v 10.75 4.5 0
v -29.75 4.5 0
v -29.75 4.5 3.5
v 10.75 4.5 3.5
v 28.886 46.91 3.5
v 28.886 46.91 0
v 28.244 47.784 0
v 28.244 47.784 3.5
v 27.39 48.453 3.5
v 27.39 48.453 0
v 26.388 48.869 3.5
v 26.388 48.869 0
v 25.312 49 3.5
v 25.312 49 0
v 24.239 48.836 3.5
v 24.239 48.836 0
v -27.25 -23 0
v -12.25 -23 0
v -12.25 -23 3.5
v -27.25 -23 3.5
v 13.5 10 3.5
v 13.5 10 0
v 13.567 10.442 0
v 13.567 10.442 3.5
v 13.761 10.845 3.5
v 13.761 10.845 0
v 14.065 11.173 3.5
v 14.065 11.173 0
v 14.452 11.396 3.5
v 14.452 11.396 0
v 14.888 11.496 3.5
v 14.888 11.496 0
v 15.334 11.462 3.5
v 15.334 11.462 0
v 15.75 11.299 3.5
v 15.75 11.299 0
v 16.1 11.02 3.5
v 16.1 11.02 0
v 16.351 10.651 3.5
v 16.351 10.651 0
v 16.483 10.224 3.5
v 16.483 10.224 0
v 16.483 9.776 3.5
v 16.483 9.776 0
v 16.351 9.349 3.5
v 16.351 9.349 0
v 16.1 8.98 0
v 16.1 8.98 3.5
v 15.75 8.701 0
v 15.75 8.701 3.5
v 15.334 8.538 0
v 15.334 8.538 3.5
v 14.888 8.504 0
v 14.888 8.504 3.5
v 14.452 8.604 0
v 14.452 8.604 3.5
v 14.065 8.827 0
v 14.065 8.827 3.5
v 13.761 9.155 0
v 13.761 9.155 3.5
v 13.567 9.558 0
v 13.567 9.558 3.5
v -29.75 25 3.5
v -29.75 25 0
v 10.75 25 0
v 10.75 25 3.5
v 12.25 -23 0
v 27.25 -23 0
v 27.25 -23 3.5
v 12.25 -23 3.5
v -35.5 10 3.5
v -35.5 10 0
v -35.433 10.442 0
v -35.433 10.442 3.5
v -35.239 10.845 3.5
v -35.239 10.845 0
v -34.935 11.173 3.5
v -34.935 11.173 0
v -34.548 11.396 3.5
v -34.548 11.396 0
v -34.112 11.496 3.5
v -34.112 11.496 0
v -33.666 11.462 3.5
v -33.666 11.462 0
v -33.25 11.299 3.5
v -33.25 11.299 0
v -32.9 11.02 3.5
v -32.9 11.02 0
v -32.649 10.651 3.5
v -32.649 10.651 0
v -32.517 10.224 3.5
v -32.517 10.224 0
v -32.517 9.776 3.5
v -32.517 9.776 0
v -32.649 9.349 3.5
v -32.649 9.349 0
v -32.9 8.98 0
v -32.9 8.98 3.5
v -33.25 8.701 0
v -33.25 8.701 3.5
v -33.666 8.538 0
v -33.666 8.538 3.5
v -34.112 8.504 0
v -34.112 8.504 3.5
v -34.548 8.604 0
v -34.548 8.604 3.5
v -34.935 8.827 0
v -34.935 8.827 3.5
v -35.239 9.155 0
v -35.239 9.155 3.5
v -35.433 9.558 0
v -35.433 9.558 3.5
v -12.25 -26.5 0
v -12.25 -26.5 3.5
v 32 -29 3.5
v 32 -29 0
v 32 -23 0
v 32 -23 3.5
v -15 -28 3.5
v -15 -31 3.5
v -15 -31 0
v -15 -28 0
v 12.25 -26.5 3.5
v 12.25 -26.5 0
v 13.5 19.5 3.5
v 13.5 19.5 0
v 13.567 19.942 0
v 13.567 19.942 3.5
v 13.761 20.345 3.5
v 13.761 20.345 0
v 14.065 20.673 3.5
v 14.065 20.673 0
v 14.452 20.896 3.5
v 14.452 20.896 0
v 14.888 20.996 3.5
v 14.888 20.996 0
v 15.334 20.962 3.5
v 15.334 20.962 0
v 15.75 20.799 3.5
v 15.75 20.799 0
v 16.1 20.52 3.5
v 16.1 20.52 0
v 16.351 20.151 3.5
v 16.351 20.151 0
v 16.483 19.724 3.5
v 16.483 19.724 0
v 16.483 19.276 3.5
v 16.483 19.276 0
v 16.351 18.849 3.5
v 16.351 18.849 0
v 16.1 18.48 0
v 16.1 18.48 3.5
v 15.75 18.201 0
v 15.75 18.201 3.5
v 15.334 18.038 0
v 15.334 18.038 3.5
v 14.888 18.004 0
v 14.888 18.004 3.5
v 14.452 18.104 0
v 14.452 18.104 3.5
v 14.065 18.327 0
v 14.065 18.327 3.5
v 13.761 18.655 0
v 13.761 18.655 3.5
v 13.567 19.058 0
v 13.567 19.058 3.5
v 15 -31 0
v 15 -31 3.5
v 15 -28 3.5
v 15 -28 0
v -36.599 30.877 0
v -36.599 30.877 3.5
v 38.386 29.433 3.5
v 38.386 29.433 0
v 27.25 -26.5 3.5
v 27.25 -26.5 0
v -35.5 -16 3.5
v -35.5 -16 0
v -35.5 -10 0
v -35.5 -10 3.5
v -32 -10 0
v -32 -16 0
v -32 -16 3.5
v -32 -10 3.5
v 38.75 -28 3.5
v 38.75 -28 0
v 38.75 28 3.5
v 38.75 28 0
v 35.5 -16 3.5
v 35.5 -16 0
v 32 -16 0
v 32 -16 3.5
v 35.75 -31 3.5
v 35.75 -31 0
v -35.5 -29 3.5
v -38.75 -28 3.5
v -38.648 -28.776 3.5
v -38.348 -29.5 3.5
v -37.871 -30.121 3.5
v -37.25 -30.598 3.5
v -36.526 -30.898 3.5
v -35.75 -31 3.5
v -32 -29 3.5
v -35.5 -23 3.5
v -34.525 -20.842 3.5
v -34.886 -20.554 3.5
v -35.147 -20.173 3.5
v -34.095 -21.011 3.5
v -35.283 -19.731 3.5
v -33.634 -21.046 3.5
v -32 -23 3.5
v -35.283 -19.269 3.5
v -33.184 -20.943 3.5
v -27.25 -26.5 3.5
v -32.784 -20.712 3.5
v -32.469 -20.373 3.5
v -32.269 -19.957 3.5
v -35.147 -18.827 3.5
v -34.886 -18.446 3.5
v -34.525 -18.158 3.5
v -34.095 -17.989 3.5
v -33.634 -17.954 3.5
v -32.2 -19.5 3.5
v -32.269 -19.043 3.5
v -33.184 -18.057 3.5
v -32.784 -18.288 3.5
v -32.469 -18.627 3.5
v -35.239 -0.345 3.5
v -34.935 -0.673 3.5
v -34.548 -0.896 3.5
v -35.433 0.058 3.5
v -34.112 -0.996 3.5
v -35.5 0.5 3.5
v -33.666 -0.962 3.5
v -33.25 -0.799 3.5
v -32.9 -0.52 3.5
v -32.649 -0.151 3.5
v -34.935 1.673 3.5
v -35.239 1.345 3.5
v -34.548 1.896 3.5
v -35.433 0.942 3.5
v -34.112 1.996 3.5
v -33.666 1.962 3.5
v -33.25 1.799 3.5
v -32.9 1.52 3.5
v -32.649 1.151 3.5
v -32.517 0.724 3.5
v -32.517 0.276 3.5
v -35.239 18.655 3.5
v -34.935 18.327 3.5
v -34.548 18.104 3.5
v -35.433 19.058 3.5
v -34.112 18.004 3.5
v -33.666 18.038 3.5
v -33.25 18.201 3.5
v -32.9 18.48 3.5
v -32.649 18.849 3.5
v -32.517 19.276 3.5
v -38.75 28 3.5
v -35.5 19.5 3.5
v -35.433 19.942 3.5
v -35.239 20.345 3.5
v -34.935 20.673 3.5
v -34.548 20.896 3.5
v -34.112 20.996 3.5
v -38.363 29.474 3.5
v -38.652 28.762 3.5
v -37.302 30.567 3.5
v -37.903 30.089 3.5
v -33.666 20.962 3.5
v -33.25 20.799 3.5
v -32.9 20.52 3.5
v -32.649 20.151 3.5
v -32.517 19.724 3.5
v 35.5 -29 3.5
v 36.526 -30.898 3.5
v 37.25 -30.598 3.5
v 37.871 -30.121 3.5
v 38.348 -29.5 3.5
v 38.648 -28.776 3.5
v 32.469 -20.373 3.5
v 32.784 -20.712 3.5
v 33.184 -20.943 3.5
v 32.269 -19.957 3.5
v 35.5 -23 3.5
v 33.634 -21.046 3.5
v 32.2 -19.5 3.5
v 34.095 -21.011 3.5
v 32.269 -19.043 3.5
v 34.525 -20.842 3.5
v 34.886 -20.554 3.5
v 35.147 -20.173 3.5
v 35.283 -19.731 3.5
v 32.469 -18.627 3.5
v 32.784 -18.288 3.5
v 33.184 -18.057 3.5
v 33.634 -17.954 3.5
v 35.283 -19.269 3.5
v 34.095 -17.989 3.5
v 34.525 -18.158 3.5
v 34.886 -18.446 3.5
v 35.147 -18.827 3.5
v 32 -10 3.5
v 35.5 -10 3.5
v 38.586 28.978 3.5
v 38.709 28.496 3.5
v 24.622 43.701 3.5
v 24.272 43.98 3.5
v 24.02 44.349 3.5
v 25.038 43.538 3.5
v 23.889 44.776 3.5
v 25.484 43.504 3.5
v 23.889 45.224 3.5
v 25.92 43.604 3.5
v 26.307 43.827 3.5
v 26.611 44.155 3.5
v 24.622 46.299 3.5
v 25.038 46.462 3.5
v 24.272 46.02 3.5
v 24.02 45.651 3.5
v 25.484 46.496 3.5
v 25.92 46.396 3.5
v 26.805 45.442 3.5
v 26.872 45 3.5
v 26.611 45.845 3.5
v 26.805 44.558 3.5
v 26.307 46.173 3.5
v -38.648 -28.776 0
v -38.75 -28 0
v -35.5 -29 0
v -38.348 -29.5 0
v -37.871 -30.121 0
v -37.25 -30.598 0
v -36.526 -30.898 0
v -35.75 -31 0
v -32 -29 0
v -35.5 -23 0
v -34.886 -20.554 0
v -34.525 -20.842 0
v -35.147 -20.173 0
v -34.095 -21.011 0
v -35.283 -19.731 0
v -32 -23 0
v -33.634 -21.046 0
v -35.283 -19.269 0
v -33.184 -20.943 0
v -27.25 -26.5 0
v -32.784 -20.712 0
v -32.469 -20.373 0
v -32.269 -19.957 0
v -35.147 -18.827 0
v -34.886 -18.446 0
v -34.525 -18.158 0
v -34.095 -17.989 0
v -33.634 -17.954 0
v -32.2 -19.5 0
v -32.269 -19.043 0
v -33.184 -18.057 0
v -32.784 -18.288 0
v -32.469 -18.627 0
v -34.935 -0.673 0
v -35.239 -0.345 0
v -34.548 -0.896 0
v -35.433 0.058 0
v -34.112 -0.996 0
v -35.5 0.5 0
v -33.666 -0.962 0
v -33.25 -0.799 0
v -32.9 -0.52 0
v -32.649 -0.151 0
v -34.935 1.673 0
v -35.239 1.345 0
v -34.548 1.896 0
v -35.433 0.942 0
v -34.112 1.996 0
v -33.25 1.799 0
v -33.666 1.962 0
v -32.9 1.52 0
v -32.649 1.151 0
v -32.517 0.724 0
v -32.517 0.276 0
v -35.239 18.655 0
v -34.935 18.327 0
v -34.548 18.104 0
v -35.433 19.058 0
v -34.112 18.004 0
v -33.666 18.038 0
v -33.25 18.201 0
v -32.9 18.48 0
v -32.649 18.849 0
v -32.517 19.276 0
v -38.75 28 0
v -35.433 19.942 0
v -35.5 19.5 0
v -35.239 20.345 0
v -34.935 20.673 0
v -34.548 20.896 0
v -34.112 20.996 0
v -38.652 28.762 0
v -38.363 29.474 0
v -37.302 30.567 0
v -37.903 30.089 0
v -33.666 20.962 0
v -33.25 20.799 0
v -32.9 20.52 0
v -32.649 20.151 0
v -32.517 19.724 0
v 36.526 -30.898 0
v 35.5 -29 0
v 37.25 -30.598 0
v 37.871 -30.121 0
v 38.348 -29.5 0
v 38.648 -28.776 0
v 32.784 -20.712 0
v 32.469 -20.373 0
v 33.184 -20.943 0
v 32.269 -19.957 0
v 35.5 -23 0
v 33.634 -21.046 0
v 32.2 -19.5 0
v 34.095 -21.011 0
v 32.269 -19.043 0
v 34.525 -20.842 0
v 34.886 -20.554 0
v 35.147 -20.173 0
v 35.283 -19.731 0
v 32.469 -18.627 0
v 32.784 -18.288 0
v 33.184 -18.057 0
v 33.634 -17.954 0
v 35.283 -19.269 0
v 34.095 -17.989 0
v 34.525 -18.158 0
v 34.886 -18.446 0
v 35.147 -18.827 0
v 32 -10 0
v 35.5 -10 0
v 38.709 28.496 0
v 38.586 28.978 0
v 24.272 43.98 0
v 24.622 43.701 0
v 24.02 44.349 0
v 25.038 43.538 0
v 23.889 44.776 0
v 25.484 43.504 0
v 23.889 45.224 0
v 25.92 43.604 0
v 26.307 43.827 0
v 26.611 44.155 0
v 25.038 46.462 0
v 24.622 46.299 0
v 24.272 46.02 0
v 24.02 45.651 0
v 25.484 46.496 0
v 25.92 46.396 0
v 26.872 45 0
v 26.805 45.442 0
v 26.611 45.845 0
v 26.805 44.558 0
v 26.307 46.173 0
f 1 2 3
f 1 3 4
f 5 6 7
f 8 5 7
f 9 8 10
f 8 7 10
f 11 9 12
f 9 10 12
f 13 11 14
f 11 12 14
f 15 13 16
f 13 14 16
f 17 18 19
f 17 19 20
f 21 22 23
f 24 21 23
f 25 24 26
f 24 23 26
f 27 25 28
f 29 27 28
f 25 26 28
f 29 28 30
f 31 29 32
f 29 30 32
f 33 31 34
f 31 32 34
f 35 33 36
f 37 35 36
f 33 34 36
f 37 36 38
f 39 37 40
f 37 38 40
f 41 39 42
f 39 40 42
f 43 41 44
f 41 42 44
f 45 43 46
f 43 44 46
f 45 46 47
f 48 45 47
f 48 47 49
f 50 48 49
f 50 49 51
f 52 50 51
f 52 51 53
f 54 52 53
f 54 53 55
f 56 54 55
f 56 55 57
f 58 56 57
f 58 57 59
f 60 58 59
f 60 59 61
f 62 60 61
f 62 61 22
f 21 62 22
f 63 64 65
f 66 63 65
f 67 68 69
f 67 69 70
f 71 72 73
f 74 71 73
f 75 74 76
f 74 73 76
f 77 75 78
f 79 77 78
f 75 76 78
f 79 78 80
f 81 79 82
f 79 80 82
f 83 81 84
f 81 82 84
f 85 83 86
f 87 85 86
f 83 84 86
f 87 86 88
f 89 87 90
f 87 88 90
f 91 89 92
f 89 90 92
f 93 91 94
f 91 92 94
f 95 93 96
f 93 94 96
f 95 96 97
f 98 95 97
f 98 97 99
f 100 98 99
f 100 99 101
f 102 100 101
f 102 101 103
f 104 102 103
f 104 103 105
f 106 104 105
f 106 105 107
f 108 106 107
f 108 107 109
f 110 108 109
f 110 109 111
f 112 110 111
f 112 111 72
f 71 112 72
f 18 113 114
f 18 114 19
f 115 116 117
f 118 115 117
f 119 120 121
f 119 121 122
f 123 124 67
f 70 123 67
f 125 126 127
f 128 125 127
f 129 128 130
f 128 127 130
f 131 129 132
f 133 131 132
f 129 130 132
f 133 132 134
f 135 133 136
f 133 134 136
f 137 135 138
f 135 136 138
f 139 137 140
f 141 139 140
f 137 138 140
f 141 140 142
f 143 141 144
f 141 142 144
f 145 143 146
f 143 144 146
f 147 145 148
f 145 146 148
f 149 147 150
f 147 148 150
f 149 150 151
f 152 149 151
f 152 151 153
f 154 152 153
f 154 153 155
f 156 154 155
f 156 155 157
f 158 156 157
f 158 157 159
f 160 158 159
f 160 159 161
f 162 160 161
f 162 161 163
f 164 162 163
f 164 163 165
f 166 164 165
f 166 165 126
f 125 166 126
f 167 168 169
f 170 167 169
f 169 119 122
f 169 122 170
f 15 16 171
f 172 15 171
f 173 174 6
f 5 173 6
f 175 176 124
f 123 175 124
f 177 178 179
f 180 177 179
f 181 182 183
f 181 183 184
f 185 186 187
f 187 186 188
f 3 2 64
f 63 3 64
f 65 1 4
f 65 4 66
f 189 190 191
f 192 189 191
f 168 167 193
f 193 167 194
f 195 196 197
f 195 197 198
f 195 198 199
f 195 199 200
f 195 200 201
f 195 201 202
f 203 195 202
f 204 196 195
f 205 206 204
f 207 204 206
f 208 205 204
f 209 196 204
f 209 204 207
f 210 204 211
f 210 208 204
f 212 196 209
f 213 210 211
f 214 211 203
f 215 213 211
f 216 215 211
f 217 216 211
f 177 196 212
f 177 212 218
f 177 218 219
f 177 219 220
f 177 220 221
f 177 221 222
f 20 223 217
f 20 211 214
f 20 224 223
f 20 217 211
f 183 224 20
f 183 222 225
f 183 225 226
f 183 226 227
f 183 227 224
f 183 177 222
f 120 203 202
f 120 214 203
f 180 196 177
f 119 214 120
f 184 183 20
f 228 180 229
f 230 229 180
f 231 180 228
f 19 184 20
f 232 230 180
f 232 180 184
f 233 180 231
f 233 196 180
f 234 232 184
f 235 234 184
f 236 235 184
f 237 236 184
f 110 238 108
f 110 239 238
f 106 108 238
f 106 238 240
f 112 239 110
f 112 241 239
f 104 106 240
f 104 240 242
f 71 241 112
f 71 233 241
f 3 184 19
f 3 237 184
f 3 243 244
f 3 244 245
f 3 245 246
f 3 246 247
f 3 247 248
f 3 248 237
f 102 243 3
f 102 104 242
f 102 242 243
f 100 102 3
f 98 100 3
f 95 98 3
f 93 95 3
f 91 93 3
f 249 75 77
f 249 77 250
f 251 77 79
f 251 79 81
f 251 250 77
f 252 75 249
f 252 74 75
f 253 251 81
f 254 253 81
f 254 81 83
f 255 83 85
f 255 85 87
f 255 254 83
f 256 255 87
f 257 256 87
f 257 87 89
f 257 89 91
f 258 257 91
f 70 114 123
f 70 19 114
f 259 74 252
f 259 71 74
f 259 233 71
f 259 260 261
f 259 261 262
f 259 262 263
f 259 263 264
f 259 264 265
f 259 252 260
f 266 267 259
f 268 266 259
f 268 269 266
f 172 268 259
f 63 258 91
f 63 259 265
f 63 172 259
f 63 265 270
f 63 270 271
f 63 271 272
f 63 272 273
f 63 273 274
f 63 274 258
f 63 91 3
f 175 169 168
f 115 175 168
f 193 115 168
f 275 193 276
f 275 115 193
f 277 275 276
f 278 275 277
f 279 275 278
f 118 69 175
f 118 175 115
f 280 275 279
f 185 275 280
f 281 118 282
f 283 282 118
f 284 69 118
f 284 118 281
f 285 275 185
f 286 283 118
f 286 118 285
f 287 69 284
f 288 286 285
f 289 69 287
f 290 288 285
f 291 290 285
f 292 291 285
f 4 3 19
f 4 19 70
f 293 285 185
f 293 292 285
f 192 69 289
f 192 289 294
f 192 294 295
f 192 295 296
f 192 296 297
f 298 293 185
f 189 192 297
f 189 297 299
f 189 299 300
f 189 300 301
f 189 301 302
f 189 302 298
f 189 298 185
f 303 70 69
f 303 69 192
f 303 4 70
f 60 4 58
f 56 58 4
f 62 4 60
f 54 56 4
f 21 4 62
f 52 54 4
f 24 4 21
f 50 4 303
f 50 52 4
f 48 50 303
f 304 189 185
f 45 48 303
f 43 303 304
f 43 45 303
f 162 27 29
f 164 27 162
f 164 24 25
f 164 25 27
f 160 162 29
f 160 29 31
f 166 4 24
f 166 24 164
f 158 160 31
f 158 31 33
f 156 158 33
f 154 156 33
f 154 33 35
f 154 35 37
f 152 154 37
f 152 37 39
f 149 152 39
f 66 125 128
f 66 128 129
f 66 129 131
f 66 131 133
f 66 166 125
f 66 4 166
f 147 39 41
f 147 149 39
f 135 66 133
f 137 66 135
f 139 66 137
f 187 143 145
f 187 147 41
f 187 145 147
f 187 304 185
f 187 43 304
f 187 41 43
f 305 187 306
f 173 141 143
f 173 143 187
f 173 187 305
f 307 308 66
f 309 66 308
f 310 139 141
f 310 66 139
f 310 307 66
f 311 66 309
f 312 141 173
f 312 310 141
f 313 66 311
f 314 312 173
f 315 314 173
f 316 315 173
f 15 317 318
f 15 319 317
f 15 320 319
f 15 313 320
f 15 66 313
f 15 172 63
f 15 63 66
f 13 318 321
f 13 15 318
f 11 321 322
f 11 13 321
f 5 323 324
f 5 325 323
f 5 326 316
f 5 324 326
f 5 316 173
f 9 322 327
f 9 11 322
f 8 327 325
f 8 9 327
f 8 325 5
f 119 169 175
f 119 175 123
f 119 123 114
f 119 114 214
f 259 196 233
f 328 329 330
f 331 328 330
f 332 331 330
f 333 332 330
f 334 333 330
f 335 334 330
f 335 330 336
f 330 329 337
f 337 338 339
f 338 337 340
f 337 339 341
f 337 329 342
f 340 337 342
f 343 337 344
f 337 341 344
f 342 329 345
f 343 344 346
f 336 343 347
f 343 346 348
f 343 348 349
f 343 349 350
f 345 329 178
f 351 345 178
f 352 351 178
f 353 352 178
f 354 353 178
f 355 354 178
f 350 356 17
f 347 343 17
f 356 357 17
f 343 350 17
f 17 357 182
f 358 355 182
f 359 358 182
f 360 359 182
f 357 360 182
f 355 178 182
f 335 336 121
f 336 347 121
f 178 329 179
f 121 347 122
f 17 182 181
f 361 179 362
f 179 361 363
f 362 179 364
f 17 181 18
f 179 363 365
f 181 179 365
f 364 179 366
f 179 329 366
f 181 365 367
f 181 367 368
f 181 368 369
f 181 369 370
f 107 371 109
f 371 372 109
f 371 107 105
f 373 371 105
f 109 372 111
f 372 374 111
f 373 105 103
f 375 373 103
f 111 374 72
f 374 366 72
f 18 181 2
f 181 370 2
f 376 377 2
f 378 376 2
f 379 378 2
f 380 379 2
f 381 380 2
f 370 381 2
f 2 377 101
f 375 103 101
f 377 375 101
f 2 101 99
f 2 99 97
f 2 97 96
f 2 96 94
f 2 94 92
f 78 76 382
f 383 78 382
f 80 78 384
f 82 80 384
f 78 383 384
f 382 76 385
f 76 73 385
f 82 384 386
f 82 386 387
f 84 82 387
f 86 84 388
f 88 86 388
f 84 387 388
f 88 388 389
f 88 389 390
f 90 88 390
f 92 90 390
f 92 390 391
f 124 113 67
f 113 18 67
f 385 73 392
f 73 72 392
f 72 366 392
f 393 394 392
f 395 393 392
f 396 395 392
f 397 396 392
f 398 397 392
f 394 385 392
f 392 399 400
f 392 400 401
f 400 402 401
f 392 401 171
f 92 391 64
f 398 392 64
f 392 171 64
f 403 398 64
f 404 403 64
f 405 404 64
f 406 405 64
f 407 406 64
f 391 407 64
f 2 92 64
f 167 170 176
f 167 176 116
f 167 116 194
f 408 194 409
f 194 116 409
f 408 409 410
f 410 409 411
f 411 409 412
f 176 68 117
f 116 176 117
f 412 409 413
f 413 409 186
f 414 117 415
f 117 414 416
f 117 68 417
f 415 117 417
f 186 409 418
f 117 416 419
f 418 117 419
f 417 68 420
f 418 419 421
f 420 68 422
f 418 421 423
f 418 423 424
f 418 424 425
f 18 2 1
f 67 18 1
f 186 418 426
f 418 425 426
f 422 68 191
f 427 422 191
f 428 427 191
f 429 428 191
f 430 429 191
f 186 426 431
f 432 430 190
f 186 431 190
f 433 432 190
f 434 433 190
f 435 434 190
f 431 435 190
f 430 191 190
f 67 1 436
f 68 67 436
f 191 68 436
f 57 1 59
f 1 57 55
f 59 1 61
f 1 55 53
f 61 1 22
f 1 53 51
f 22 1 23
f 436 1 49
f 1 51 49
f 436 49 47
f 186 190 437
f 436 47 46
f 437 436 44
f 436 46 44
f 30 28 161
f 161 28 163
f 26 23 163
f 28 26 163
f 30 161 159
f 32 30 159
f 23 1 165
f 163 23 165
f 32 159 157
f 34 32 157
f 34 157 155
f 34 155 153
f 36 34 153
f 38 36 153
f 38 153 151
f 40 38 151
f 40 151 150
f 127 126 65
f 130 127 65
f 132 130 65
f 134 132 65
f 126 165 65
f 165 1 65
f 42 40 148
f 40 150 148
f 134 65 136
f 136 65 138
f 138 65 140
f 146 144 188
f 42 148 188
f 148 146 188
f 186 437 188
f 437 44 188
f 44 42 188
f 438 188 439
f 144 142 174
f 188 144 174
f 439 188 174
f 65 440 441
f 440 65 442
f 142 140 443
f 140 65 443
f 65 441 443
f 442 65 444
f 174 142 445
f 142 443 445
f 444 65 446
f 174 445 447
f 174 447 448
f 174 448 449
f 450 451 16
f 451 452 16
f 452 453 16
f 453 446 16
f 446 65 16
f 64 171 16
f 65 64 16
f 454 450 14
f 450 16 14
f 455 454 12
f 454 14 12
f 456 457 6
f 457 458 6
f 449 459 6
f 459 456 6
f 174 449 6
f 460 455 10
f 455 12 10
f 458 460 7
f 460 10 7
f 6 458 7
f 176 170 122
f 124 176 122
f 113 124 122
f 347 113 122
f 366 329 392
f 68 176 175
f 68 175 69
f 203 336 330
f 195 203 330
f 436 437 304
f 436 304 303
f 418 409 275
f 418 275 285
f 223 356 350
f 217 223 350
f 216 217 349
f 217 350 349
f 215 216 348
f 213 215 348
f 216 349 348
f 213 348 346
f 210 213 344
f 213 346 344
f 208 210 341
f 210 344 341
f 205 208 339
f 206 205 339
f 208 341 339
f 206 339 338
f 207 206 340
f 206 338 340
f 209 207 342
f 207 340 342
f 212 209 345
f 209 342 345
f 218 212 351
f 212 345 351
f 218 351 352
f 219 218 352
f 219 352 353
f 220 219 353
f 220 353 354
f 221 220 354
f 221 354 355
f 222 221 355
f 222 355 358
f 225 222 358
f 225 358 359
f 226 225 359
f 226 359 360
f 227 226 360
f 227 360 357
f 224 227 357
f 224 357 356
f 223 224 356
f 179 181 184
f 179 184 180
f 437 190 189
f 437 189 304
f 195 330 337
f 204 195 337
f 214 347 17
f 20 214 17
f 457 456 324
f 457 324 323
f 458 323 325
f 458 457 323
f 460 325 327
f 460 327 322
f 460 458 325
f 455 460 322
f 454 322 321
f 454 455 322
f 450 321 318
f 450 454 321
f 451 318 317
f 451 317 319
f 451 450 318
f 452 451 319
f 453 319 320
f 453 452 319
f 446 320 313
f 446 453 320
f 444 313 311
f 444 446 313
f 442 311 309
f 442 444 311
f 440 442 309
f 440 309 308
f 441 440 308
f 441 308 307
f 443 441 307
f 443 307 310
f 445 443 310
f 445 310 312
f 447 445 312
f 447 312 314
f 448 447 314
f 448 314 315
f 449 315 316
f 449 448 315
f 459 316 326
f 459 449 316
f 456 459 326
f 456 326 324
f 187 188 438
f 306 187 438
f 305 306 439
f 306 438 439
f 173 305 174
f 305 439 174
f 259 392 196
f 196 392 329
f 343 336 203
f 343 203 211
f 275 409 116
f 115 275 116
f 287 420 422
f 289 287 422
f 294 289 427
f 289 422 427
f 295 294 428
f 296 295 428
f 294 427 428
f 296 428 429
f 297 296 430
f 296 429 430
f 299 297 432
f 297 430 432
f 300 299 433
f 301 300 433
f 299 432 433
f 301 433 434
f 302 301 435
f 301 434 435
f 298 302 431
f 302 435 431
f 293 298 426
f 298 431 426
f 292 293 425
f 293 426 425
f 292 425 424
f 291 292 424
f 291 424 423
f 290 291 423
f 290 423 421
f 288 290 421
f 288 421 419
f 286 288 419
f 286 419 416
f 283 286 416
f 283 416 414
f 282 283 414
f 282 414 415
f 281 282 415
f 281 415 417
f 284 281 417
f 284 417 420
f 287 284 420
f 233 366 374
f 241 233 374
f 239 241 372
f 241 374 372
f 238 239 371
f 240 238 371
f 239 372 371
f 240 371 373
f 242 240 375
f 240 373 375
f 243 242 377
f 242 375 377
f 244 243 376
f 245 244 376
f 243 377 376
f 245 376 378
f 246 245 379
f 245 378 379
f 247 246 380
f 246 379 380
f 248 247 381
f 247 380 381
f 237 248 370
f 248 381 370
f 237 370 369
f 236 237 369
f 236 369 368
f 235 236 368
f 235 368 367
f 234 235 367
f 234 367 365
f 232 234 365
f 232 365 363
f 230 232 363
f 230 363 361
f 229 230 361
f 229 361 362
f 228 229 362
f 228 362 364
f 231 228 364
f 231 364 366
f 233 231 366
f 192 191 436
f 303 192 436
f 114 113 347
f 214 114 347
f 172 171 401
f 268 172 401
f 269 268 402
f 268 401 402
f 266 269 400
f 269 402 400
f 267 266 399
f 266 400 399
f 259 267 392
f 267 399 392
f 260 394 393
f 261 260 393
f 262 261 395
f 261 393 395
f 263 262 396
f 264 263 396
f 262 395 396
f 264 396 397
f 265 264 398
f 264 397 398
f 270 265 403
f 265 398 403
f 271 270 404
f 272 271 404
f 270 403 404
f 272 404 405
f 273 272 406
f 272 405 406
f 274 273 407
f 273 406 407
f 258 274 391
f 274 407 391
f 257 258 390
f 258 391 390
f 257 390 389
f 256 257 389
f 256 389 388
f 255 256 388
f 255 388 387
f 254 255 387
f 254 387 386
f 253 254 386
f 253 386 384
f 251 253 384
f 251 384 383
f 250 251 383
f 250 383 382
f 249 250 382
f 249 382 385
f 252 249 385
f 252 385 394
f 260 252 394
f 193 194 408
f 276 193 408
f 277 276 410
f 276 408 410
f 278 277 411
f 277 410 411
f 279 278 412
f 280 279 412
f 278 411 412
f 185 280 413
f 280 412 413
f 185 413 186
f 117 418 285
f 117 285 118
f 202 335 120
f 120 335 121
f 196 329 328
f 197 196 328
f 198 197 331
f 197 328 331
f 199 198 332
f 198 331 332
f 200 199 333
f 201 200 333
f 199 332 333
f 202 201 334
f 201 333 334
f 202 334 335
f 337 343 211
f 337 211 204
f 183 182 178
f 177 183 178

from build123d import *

# Parameters (mm, degrees)
SKETCH1_R           = 1.5
SKETCH1_W           = 40.5
SKETCH1_H           = 20.5
BOSS_EXTRUDE1_DEPTH = 3.5
SKETCH2_R           = 1.55
SKETCH2_W           = 3.5
SKETCH2_H           = 6
CUT_EXTRUDE1_DEPTH  = 63.568462503
SKETCH3_W           = 15
SKETCH3_H           = 3.5
CUT_EXTRUDE2_DEPTH  = 63.568462503
SKETCH4_R           = 1.5
CUT_EXTRUDE3_DEPTH  = 63.568462503
CUT_EXTRUDE5_REACH  = 64.568
SKETCH5_R           = 1.5
SKETCH6_W           = 30
SKETCH6_H           = 3
CUT_EXTRUDE6_DEPTH  = 10


with BuildPart() as part:
    # Sketch1 → Boss-Extrude1 (new body)
    with BuildSketch(Plane.XY):
        with BuildLine():
            Line((-35.75, -31), (35.75, -31))
            ThreePointArc((35.75, -31), (37.871320344, -30.121320344), (38.75, -28))
            Line((38.75, -28), (38.75, 28))
            ThreePointArc((38.75, 28), (38.657529209, 28.739103444), (38.385817399, 29.432643235))
            Line((38.385817399, 29.432643235), (28.88626309, 46.91019098))
            ThreePointArc((28.88626309, 46.91019098), (26.903491848, 48.695137654), (24.239382807, 48.836344739))
            Line((24.239382807, 48.836344739), (-36.599342813, 30.877258554))
            ThreePointArc((-36.599342813, 30.877258554), (-38.152917855, 29.796102943), (-38.75, 28))
            Line((-38.75, 28), (-38.75, -28))
            ThreePointArc((-38.75, -28), (-37.871320344, -30.121320344), (-35.75, -31))
        make_face()
        with Locations((25.371839891, 45)):
            Circle(SKETCH1_R, mode=Mode.SUBTRACT)
        with Locations((-9.5, 14.75)):
            Rectangle(SKETCH1_W, SKETCH1_H, mode=Mode.SUBTRACT)
    extrude(amount=BOSS_EXTRUDE1_DEPTH)

    # Sketch2 → Cut-Extrude1 (cut, through all)
    with BuildSketch(Plane(origin=(0, 0, 0), x_dir=(-1, 0, 0), z_dir=(0, 0, -1))):
        with Locations((-33.75, -19.5)):
            Circle(SKETCH2_R)
        with Locations(Location((33.75, -19.5, 0), (0, 0, 180))):
            Circle(SKETCH2_R)
        with Locations((-33.75, -13)):
            Rectangle(SKETCH2_W, SKETCH2_H)
        with Locations((-33.75, -26)):
            Rectangle(SKETCH2_W, SKETCH2_H)
        with Locations((33.75, -26)):
            Rectangle(SKETCH2_W, SKETCH2_H)
        with Locations((33.75, -13)):
            Rectangle(SKETCH2_W, SKETCH2_H)
    extrude(amount=-CUT_EXTRUDE1_DEPTH, mode=Mode.SUBTRACT)

    # Sketch3 → Cut-Extrude2 (cut, through all)
    with BuildSketch(Plane(origin=(0, 0, 0), x_dir=(-1, 0, 0), z_dir=(0, 0, -1))):
        with Locations((19.75, -24.75)):
            Rectangle(SKETCH3_W, SKETCH3_H)
        with Locations((-19.75, -24.75)):
            Rectangle(SKETCH3_W, SKETCH3_H)
    extrude(amount=-CUT_EXTRUDE2_DEPTH, mode=Mode.SUBTRACT)

    # Sketch4 → Cut-Extrude3 (cut, through all)
    with BuildSketch(Plane(origin=(0, 0, 0), x_dir=(-1, 0, 0), z_dir=(0, 0, -1))):
        with Locations((-15, 19.5)):
            Circle(SKETCH4_R)
        with Locations((-15, 10)):
            Circle(SKETCH4_R)
        with Locations((34, 10)):
            Circle(SKETCH4_R)
        with Locations((34, 19.5)):
            Circle(SKETCH4_R)
    extrude(amount=-CUT_EXTRUDE3_DEPTH, mode=Mode.SUBTRACT)

    # Sketch5 → Cut-Extrude5 (cut, up to next)
    with BuildSketch(Plane(origin=(0, 0, 0), x_dir=(-1, 0, 0), z_dir=(0, 0, -1)), mode=Mode.PRIVATE) as cut_extrude5_sk1:
        with Locations((34, 0.5)):
            Circle(SKETCH5_R)
    cut_extrude5_tool1 = extrude(cut_extrude5_sk1.sketch, amount=-CUT_EXTRUDE5_REACH, mode=Mode.PRIVATE) & part.part
    add(cut_extrude5_tool1.solids().sort_by_distance((-34, 0.5, 0))[0], mode=Mode.SUBTRACT)

    # Sketch6 → Cut-Extrude6 (cut)
    with BuildSketch(Plane.XY.offset(3.5)):
        with Locations((0, -29.5)):
            Rectangle(SKETCH6_W, SKETCH6_H)
    extrude(amount=-CUT_EXTRUDE6_DEPTH, mode=Mode.SUBTRACT)


solid = part.part
